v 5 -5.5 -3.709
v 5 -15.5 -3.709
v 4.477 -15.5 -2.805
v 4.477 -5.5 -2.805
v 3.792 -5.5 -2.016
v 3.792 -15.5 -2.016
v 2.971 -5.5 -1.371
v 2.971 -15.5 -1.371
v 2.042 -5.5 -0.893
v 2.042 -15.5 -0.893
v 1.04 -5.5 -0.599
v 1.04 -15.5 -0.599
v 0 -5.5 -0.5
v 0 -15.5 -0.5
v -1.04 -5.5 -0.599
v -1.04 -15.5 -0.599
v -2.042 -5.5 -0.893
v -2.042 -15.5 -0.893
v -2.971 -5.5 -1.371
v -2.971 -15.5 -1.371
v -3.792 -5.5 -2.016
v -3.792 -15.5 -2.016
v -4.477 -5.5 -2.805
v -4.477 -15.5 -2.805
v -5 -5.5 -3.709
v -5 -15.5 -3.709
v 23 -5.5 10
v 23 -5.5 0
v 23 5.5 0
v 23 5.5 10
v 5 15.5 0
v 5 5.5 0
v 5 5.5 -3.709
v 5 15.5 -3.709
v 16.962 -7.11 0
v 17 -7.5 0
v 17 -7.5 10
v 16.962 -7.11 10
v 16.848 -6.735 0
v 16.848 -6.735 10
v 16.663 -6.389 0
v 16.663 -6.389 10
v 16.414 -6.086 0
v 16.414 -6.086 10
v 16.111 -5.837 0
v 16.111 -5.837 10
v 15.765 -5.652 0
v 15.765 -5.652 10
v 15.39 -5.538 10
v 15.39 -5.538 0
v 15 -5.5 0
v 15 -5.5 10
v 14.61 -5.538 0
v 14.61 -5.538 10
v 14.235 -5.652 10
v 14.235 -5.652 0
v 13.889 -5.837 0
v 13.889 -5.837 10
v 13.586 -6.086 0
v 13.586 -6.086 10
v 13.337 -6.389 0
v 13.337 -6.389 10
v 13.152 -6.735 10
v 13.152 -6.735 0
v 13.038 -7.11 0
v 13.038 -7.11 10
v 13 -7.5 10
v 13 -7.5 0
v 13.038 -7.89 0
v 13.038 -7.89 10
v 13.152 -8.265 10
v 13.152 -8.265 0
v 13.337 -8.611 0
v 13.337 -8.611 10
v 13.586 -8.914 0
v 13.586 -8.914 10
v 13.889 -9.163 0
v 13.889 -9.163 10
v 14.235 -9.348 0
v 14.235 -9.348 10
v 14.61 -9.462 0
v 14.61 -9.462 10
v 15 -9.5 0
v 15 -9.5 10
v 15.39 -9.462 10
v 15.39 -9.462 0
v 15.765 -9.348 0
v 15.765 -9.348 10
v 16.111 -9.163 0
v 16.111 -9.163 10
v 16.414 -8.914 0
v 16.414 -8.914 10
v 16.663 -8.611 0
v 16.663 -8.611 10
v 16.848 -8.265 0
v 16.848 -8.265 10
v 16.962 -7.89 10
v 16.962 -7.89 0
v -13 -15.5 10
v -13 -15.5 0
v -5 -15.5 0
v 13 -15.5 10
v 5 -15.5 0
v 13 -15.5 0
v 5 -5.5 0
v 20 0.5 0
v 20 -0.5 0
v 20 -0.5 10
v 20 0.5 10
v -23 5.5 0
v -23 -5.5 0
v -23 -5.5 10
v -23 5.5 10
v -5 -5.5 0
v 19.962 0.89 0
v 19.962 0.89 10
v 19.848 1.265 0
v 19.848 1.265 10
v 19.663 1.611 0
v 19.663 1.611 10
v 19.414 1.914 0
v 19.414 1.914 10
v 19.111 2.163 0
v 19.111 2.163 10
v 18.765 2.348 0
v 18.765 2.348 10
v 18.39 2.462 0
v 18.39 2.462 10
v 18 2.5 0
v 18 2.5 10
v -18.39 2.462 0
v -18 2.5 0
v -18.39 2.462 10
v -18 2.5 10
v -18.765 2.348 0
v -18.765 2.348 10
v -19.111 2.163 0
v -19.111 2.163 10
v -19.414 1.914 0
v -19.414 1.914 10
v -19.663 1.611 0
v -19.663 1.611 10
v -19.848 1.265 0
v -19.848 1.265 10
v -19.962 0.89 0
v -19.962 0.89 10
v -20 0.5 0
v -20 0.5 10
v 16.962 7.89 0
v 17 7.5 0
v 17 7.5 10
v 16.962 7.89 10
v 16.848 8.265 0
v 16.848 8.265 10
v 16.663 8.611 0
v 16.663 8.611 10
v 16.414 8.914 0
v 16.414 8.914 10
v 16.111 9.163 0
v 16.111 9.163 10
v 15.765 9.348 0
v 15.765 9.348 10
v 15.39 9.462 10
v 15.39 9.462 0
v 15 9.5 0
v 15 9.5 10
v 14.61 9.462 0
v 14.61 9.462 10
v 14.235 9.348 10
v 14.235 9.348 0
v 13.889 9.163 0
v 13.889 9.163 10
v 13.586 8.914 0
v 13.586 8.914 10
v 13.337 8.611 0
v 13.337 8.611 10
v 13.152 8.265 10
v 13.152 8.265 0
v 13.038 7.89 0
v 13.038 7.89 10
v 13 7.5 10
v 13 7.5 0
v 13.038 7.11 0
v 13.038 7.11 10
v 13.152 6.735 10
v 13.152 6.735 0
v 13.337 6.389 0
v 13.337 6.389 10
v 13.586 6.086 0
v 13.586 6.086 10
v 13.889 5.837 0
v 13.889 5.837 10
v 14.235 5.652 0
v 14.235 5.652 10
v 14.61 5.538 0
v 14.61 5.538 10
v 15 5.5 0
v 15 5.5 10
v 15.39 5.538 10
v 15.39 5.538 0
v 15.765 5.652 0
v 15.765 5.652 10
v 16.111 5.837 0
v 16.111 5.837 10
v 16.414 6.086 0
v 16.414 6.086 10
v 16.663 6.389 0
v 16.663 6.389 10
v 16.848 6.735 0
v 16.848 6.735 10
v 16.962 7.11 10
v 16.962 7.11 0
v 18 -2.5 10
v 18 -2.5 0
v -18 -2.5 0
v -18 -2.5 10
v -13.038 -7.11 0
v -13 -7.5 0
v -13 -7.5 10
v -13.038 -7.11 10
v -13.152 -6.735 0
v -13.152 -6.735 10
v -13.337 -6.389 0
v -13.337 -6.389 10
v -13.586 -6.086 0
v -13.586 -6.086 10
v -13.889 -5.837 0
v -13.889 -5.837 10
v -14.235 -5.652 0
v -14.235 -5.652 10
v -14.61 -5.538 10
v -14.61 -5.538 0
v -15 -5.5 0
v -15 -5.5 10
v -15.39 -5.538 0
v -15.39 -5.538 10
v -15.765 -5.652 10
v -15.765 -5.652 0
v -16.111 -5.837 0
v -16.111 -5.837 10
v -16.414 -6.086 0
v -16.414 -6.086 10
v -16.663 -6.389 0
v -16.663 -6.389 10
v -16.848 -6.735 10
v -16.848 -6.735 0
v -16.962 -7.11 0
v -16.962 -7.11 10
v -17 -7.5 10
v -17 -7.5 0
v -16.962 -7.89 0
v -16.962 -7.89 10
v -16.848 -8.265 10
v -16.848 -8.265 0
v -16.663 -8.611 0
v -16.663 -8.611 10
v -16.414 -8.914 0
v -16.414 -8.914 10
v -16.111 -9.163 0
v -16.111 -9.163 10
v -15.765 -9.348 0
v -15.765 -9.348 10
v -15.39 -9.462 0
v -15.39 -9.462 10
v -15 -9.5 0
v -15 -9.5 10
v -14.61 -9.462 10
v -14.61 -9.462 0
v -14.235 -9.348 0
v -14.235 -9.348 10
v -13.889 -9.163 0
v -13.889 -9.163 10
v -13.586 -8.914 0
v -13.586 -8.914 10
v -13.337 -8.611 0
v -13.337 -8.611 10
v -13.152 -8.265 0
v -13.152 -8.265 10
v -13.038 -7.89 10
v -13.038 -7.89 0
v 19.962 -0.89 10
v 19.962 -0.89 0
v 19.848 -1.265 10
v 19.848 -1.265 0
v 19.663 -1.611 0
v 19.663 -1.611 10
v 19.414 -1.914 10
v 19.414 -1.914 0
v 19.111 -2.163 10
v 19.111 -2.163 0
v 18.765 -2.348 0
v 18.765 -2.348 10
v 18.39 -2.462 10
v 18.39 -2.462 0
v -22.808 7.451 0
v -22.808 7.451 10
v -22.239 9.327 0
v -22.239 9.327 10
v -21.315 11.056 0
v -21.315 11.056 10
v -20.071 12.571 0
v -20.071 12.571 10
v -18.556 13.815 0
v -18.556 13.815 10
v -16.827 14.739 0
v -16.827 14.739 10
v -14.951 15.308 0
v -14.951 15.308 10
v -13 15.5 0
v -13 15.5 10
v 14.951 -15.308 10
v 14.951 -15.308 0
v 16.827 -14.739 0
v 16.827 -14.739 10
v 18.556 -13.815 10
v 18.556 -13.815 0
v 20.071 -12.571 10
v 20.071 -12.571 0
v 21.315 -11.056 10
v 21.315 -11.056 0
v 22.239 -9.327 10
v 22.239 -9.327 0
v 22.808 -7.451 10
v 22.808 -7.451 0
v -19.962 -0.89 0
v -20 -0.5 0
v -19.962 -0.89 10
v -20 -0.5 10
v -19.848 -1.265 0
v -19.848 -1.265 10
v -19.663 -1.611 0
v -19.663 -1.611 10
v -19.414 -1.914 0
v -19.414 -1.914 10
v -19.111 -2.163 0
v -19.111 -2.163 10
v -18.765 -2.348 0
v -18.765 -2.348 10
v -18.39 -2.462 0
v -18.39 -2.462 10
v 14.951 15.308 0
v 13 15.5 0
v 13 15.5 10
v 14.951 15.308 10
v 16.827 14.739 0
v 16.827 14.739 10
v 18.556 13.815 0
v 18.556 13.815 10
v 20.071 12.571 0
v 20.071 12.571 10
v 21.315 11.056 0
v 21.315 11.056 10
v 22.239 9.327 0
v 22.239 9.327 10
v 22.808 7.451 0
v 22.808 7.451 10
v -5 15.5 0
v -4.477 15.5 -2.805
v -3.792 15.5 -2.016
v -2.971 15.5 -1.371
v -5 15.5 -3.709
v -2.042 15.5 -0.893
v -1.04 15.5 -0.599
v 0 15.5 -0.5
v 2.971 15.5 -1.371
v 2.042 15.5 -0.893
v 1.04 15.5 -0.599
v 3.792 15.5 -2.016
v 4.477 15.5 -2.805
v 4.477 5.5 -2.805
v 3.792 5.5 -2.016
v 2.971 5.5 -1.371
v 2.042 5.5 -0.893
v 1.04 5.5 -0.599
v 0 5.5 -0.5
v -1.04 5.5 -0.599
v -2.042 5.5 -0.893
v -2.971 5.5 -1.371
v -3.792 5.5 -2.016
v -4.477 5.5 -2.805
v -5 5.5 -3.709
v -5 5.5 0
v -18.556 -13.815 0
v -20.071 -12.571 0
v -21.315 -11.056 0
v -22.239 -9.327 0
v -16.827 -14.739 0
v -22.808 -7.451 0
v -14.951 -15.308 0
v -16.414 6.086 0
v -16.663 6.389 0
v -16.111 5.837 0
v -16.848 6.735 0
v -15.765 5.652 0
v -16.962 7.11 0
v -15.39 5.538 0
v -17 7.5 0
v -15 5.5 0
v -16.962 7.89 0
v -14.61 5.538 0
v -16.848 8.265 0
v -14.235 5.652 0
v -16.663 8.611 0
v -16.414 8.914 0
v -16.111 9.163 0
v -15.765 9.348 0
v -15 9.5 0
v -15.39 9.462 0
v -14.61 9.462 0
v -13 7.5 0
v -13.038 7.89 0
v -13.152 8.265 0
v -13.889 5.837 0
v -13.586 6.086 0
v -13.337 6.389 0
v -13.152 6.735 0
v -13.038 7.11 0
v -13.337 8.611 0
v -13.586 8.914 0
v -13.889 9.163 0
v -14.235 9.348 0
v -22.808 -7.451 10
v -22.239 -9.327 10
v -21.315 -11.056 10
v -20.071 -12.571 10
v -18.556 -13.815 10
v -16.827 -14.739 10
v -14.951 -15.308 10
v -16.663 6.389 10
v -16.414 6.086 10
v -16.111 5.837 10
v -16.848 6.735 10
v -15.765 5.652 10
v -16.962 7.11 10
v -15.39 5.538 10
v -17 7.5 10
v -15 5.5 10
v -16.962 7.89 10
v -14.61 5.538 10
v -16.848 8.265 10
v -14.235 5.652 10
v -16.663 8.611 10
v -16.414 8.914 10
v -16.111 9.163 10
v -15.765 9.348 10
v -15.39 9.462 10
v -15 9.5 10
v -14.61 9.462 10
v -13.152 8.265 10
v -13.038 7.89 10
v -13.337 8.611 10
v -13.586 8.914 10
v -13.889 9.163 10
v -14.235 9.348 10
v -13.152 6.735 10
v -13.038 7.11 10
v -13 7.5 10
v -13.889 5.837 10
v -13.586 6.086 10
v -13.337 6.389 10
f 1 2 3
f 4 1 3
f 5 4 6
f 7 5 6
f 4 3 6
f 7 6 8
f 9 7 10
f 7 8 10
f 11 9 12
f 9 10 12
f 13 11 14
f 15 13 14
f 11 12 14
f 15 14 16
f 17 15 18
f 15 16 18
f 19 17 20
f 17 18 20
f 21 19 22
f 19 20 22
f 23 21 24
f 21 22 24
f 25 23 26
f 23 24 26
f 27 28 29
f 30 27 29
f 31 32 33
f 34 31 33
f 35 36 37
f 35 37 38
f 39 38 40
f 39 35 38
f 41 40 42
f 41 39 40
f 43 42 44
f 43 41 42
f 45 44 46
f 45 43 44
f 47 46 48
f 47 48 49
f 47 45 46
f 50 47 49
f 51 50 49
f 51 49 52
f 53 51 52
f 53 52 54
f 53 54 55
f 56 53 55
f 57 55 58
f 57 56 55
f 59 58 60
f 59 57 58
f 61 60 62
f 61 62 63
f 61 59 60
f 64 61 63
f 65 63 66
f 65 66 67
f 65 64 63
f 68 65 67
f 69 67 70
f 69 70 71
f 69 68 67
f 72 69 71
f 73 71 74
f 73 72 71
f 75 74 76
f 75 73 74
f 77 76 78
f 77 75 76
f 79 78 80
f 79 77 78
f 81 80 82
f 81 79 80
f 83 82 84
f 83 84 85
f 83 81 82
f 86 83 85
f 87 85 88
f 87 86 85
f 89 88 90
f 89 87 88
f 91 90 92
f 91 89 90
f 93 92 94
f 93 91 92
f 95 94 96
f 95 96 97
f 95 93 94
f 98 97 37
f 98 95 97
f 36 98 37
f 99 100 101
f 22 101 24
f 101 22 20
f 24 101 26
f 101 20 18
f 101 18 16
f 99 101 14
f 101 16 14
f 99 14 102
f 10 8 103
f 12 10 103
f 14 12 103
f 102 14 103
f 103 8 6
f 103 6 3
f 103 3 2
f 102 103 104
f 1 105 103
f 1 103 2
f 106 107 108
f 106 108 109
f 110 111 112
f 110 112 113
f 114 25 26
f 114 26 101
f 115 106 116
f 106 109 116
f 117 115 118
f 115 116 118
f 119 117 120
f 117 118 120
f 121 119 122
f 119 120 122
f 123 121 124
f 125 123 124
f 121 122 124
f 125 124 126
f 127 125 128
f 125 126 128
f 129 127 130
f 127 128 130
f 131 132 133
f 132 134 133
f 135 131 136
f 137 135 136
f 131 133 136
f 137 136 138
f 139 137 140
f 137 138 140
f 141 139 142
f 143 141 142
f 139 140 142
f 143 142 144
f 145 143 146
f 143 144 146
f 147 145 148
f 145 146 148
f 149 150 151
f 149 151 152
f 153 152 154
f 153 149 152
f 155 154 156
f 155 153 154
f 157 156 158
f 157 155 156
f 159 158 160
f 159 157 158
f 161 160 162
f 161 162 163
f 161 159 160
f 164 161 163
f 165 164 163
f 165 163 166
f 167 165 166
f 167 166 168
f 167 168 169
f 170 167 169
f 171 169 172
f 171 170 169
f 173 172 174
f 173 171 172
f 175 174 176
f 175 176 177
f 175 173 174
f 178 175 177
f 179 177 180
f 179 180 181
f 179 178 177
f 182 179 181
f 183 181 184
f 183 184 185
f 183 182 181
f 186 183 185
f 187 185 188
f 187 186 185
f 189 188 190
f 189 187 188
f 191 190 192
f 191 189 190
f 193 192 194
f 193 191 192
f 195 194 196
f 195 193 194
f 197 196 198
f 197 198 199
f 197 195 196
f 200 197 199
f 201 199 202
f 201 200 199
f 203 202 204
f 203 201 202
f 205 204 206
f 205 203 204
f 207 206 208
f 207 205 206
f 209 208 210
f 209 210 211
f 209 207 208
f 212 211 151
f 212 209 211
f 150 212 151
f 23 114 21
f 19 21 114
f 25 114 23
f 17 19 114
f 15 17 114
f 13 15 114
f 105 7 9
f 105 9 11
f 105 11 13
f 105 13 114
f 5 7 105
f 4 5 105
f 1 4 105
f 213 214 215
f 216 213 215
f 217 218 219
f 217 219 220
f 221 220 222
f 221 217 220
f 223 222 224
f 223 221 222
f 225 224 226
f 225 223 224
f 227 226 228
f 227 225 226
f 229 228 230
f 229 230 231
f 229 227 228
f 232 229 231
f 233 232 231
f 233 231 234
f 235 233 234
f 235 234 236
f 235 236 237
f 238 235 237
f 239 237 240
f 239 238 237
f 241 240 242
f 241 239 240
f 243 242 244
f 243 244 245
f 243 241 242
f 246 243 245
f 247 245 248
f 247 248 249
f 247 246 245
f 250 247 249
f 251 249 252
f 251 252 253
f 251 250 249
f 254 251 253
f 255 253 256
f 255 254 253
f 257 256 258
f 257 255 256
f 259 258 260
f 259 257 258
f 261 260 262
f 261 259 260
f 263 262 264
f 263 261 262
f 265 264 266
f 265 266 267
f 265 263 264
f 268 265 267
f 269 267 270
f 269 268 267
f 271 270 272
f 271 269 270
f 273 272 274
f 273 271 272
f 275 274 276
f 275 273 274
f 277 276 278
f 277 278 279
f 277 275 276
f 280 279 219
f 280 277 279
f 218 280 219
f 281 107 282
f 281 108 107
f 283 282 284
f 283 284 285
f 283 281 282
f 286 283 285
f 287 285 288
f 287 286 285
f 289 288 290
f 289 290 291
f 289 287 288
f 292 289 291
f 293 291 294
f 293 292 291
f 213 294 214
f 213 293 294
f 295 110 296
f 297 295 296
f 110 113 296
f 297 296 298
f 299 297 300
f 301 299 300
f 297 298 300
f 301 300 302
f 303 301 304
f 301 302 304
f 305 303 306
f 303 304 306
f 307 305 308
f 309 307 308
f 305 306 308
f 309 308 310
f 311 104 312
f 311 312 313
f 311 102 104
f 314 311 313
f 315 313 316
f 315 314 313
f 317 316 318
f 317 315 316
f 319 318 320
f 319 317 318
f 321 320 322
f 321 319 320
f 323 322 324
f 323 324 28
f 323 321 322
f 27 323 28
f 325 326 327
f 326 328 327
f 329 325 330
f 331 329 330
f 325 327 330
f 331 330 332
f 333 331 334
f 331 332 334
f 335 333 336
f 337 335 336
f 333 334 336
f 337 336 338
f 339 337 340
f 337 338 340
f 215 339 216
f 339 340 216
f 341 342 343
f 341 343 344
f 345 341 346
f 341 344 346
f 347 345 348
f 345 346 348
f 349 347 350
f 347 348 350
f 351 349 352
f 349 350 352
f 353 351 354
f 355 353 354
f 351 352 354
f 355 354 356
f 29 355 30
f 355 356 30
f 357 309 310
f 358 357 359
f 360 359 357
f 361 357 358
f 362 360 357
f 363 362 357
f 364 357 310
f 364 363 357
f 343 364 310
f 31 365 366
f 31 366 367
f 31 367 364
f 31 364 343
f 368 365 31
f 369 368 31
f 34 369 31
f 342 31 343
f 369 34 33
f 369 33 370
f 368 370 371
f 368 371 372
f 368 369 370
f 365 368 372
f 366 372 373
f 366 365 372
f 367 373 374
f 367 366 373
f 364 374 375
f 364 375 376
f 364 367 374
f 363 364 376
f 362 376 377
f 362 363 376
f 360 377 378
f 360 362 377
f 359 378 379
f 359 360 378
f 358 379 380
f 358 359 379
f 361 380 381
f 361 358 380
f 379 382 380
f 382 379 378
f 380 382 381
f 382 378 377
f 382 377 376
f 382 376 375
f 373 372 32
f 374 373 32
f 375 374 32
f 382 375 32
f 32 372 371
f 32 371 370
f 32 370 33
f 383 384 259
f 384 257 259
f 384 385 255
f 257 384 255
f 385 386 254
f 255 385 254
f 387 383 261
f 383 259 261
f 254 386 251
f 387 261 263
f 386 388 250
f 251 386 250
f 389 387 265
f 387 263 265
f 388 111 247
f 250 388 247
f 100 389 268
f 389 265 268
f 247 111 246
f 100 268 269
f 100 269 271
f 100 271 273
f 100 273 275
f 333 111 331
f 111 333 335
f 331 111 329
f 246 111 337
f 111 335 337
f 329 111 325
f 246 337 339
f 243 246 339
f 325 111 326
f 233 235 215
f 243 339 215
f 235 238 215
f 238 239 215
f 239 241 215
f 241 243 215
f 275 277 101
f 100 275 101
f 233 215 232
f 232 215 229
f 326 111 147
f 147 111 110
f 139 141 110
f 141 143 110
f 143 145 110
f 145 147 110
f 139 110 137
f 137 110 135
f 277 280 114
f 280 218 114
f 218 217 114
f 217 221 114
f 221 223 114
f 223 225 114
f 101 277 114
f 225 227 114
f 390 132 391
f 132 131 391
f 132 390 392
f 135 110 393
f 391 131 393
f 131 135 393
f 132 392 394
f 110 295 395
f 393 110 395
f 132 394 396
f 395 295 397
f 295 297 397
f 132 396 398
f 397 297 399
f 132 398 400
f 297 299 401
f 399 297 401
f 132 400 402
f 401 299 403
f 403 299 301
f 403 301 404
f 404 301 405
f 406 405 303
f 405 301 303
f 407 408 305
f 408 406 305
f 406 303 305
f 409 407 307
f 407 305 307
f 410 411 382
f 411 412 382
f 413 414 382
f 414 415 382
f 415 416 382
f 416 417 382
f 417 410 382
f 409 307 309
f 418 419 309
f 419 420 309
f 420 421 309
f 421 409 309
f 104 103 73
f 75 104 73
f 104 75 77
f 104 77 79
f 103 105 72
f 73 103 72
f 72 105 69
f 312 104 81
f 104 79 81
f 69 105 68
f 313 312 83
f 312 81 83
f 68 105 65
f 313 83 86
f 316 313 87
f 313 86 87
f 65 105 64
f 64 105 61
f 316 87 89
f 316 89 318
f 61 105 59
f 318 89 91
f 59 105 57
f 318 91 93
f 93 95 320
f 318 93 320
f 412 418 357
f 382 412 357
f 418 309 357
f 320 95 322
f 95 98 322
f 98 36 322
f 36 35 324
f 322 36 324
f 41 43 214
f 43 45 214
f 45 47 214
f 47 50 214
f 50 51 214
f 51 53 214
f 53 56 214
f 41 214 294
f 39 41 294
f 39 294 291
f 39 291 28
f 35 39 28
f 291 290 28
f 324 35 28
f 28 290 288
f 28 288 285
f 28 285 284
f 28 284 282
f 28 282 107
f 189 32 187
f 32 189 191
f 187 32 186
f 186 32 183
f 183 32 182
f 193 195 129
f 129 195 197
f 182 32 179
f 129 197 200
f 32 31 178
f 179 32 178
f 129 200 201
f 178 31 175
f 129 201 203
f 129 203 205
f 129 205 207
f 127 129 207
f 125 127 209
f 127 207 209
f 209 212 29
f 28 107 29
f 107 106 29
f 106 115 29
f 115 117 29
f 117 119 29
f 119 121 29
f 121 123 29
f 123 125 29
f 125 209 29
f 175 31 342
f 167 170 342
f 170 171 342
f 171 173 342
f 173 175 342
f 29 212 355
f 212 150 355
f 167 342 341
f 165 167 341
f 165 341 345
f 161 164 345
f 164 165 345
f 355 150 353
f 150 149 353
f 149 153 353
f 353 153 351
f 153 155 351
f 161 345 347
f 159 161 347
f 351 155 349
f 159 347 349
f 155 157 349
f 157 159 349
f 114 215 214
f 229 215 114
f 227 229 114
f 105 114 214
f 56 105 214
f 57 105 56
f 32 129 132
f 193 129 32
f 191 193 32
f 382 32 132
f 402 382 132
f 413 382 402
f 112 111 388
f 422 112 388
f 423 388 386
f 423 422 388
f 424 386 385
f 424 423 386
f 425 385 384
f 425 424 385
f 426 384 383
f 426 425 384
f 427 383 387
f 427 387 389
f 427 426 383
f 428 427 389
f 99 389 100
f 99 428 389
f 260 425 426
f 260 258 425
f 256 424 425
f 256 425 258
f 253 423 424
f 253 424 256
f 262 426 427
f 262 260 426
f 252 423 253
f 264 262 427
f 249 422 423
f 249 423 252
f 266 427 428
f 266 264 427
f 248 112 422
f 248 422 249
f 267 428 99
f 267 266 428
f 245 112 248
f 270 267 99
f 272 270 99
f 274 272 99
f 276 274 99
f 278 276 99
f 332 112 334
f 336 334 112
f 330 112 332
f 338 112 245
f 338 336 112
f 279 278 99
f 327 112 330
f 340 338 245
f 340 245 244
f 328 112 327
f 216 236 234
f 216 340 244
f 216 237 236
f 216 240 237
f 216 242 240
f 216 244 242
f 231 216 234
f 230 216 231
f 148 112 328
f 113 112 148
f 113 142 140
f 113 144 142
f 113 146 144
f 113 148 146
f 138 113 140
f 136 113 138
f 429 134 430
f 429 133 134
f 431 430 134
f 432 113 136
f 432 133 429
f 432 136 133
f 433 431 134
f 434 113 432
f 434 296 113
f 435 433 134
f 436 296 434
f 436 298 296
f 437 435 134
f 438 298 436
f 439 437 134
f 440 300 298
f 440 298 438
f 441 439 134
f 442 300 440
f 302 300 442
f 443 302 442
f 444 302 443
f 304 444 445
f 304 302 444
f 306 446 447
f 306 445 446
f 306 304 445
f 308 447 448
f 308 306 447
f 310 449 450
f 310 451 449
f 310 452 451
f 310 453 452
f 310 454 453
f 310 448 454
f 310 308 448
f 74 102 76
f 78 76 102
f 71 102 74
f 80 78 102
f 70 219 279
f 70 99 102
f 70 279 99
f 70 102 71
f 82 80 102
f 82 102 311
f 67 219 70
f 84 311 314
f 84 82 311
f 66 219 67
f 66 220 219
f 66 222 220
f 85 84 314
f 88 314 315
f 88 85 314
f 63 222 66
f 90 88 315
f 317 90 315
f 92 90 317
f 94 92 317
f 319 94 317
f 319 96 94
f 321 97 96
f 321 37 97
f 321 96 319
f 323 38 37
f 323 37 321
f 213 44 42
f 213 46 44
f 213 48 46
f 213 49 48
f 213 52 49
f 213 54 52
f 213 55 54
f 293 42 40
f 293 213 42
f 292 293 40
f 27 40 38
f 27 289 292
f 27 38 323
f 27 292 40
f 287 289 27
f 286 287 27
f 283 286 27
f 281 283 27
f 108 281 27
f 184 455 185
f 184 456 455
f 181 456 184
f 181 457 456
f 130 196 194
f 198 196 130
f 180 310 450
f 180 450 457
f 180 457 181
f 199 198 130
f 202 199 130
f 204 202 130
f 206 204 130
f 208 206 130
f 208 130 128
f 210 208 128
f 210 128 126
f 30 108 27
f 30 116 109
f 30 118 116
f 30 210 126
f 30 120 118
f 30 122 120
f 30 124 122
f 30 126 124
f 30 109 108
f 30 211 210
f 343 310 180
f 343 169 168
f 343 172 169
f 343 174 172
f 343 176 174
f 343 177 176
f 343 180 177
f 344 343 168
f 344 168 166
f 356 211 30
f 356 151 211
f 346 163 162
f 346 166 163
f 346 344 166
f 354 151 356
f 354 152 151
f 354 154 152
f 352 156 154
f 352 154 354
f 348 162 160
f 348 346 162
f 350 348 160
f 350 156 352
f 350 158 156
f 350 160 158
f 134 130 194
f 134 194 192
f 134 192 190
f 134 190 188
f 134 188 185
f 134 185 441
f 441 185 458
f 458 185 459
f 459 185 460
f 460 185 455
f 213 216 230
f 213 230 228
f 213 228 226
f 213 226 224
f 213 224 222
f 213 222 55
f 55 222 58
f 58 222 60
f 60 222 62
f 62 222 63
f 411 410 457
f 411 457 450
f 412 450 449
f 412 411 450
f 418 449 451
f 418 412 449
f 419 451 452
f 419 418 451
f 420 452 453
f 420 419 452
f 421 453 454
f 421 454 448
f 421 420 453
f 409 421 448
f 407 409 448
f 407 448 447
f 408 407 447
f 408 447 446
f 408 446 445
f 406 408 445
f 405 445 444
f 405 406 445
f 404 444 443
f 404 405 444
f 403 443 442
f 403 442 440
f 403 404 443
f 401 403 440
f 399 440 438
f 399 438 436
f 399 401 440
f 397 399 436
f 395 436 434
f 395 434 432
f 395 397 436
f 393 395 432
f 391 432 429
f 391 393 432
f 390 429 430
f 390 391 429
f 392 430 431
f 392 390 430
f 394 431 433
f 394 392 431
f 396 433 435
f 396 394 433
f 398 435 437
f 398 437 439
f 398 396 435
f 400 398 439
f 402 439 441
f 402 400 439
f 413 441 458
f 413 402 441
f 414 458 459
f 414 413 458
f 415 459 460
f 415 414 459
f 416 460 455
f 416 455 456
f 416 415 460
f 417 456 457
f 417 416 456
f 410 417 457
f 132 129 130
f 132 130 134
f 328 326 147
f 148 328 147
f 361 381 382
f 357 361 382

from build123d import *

# Parameters (mm, degrees)
SKETCH1_W               = 46
SKETCH1_H               = 31
SKETCH1_R               = 2
BOSS_EXTRUDE1_DEPTH     = 10
FILLET1_R               = 10
BOSS_EXTRUDE2_START     = 15.5
BOSS_EXTRUDE2_DEPTH     = 10
BOSS_EXTRUDE3_START     = -15.5
BOSS_EXTRUDE3_DEPTH     = 10
SKETCH4_W               = 40
SKETCH4_H               = 5
CUT_EXTRUDE1_DEPTH      = 30.483045976
CUT_EXTRUDE1_DEPTH_BACK = 30.483045976
FILLET2_R               = 2


with BuildPart() as part:
    # Sketch1 → Boss-Extrude1 (new body)
    with BuildSketch(Plane.XY):
        Rectangle(SKETCH1_W, SKETCH1_H)
        with Locations((-15, 7.5)):
            Circle(SKETCH1_R, mode=Mode.SUBTRACT)
        with Locations((15, 7.5)):
            Circle(SKETCH1_R, mode=Mode.SUBTRACT)
        with Locations((15, -7.5)):
            Circle(SKETCH1_R, mode=Mode.SUBTRACT)
        with Locations((-15, -7.5)):
            Circle(SKETCH1_R, mode=Mode.SUBTRACT)
    extrude(amount=BOSS_EXTRUDE1_DEPTH)

    # Fillet1
    fillet1_edges = [part.edges().sort_by_distance(p)[0] for p in [
        (23, -15.5, 5),
        (-23, -15.5, 5),
        (-23, 15.5, 5),
        (23, 15.5, 5),
    ]]
    fillet(fillet1_edges, radius=FILLET1_R)

    # Sketch3 → Boss-Extrude2 (add)
    with BuildSketch(Plane(origin=(0, 0, 0), x_dir=(1, 0, 0), z_dir=(0, 1, 0)).offset(BOSS_EXTRUDE2_START)):
        with BuildLine():
            Line((-5, 3.708712153), (-5, 0))
            Line((-5, 0), (5, 0))
            Line((5, 0), (5, 3.708712153))
            ThreePointArc((5, 3.708712153), (0, 0.5), (-5, 3.708712153))
        make_face()
    extrude(amount=-BOSS_EXTRUDE2_DEPTH)

    # Sketch3<3> → Boss-Extrude3 (add)
    with BuildSketch(Plane(origin=(0, 0, 0), x_dir=(1, 0, 0), z_dir=(0, 1, 0)).offset(BOSS_EXTRUDE3_START)):
        with BuildLine():
            Line((-5, 3.708712153), (-5, 0))
            Line((-5, 0), (5, 0))
            Line((5, 0), (5, 3.708712153))
            ThreePointArc((5, 3.708712153), (0, 0.5), (-5, 3.708712153))
        make_face()
    extrude(amount=BOSS_EXTRUDE3_DEPTH)

    # Sketch4 → Cut-Extrude1 (cut, two sides)
    with BuildSketch(Plane(origin=(0, 0, 0), x_dir=(-1, 0, 0), z_dir=(0, 0, -1))) as cut_extrude1_sk:
        Rectangle(SKETCH4_W, SKETCH4_H)
    extrude(amount=CUT_EXTRUDE1_DEPTH, mode=Mode.SUBTRACT)
    extrude(cut_extrude1_sk.sketch, amount=-CUT_EXTRUDE1_DEPTH_BACK, mode=Mode.SUBTRACT)

    # Fillet2
    fillet2_edges = [part.edges().sort_by_distance(p)[0] for p in [
        (-20, 2.5, 5),
        (-20, -2.5, 5),
        (20, -2.5, 5),
        (20, 2.5, 5),
    ]]
    fillet(fillet2_edges, radius=FILLET2_R)


solid = part.part
